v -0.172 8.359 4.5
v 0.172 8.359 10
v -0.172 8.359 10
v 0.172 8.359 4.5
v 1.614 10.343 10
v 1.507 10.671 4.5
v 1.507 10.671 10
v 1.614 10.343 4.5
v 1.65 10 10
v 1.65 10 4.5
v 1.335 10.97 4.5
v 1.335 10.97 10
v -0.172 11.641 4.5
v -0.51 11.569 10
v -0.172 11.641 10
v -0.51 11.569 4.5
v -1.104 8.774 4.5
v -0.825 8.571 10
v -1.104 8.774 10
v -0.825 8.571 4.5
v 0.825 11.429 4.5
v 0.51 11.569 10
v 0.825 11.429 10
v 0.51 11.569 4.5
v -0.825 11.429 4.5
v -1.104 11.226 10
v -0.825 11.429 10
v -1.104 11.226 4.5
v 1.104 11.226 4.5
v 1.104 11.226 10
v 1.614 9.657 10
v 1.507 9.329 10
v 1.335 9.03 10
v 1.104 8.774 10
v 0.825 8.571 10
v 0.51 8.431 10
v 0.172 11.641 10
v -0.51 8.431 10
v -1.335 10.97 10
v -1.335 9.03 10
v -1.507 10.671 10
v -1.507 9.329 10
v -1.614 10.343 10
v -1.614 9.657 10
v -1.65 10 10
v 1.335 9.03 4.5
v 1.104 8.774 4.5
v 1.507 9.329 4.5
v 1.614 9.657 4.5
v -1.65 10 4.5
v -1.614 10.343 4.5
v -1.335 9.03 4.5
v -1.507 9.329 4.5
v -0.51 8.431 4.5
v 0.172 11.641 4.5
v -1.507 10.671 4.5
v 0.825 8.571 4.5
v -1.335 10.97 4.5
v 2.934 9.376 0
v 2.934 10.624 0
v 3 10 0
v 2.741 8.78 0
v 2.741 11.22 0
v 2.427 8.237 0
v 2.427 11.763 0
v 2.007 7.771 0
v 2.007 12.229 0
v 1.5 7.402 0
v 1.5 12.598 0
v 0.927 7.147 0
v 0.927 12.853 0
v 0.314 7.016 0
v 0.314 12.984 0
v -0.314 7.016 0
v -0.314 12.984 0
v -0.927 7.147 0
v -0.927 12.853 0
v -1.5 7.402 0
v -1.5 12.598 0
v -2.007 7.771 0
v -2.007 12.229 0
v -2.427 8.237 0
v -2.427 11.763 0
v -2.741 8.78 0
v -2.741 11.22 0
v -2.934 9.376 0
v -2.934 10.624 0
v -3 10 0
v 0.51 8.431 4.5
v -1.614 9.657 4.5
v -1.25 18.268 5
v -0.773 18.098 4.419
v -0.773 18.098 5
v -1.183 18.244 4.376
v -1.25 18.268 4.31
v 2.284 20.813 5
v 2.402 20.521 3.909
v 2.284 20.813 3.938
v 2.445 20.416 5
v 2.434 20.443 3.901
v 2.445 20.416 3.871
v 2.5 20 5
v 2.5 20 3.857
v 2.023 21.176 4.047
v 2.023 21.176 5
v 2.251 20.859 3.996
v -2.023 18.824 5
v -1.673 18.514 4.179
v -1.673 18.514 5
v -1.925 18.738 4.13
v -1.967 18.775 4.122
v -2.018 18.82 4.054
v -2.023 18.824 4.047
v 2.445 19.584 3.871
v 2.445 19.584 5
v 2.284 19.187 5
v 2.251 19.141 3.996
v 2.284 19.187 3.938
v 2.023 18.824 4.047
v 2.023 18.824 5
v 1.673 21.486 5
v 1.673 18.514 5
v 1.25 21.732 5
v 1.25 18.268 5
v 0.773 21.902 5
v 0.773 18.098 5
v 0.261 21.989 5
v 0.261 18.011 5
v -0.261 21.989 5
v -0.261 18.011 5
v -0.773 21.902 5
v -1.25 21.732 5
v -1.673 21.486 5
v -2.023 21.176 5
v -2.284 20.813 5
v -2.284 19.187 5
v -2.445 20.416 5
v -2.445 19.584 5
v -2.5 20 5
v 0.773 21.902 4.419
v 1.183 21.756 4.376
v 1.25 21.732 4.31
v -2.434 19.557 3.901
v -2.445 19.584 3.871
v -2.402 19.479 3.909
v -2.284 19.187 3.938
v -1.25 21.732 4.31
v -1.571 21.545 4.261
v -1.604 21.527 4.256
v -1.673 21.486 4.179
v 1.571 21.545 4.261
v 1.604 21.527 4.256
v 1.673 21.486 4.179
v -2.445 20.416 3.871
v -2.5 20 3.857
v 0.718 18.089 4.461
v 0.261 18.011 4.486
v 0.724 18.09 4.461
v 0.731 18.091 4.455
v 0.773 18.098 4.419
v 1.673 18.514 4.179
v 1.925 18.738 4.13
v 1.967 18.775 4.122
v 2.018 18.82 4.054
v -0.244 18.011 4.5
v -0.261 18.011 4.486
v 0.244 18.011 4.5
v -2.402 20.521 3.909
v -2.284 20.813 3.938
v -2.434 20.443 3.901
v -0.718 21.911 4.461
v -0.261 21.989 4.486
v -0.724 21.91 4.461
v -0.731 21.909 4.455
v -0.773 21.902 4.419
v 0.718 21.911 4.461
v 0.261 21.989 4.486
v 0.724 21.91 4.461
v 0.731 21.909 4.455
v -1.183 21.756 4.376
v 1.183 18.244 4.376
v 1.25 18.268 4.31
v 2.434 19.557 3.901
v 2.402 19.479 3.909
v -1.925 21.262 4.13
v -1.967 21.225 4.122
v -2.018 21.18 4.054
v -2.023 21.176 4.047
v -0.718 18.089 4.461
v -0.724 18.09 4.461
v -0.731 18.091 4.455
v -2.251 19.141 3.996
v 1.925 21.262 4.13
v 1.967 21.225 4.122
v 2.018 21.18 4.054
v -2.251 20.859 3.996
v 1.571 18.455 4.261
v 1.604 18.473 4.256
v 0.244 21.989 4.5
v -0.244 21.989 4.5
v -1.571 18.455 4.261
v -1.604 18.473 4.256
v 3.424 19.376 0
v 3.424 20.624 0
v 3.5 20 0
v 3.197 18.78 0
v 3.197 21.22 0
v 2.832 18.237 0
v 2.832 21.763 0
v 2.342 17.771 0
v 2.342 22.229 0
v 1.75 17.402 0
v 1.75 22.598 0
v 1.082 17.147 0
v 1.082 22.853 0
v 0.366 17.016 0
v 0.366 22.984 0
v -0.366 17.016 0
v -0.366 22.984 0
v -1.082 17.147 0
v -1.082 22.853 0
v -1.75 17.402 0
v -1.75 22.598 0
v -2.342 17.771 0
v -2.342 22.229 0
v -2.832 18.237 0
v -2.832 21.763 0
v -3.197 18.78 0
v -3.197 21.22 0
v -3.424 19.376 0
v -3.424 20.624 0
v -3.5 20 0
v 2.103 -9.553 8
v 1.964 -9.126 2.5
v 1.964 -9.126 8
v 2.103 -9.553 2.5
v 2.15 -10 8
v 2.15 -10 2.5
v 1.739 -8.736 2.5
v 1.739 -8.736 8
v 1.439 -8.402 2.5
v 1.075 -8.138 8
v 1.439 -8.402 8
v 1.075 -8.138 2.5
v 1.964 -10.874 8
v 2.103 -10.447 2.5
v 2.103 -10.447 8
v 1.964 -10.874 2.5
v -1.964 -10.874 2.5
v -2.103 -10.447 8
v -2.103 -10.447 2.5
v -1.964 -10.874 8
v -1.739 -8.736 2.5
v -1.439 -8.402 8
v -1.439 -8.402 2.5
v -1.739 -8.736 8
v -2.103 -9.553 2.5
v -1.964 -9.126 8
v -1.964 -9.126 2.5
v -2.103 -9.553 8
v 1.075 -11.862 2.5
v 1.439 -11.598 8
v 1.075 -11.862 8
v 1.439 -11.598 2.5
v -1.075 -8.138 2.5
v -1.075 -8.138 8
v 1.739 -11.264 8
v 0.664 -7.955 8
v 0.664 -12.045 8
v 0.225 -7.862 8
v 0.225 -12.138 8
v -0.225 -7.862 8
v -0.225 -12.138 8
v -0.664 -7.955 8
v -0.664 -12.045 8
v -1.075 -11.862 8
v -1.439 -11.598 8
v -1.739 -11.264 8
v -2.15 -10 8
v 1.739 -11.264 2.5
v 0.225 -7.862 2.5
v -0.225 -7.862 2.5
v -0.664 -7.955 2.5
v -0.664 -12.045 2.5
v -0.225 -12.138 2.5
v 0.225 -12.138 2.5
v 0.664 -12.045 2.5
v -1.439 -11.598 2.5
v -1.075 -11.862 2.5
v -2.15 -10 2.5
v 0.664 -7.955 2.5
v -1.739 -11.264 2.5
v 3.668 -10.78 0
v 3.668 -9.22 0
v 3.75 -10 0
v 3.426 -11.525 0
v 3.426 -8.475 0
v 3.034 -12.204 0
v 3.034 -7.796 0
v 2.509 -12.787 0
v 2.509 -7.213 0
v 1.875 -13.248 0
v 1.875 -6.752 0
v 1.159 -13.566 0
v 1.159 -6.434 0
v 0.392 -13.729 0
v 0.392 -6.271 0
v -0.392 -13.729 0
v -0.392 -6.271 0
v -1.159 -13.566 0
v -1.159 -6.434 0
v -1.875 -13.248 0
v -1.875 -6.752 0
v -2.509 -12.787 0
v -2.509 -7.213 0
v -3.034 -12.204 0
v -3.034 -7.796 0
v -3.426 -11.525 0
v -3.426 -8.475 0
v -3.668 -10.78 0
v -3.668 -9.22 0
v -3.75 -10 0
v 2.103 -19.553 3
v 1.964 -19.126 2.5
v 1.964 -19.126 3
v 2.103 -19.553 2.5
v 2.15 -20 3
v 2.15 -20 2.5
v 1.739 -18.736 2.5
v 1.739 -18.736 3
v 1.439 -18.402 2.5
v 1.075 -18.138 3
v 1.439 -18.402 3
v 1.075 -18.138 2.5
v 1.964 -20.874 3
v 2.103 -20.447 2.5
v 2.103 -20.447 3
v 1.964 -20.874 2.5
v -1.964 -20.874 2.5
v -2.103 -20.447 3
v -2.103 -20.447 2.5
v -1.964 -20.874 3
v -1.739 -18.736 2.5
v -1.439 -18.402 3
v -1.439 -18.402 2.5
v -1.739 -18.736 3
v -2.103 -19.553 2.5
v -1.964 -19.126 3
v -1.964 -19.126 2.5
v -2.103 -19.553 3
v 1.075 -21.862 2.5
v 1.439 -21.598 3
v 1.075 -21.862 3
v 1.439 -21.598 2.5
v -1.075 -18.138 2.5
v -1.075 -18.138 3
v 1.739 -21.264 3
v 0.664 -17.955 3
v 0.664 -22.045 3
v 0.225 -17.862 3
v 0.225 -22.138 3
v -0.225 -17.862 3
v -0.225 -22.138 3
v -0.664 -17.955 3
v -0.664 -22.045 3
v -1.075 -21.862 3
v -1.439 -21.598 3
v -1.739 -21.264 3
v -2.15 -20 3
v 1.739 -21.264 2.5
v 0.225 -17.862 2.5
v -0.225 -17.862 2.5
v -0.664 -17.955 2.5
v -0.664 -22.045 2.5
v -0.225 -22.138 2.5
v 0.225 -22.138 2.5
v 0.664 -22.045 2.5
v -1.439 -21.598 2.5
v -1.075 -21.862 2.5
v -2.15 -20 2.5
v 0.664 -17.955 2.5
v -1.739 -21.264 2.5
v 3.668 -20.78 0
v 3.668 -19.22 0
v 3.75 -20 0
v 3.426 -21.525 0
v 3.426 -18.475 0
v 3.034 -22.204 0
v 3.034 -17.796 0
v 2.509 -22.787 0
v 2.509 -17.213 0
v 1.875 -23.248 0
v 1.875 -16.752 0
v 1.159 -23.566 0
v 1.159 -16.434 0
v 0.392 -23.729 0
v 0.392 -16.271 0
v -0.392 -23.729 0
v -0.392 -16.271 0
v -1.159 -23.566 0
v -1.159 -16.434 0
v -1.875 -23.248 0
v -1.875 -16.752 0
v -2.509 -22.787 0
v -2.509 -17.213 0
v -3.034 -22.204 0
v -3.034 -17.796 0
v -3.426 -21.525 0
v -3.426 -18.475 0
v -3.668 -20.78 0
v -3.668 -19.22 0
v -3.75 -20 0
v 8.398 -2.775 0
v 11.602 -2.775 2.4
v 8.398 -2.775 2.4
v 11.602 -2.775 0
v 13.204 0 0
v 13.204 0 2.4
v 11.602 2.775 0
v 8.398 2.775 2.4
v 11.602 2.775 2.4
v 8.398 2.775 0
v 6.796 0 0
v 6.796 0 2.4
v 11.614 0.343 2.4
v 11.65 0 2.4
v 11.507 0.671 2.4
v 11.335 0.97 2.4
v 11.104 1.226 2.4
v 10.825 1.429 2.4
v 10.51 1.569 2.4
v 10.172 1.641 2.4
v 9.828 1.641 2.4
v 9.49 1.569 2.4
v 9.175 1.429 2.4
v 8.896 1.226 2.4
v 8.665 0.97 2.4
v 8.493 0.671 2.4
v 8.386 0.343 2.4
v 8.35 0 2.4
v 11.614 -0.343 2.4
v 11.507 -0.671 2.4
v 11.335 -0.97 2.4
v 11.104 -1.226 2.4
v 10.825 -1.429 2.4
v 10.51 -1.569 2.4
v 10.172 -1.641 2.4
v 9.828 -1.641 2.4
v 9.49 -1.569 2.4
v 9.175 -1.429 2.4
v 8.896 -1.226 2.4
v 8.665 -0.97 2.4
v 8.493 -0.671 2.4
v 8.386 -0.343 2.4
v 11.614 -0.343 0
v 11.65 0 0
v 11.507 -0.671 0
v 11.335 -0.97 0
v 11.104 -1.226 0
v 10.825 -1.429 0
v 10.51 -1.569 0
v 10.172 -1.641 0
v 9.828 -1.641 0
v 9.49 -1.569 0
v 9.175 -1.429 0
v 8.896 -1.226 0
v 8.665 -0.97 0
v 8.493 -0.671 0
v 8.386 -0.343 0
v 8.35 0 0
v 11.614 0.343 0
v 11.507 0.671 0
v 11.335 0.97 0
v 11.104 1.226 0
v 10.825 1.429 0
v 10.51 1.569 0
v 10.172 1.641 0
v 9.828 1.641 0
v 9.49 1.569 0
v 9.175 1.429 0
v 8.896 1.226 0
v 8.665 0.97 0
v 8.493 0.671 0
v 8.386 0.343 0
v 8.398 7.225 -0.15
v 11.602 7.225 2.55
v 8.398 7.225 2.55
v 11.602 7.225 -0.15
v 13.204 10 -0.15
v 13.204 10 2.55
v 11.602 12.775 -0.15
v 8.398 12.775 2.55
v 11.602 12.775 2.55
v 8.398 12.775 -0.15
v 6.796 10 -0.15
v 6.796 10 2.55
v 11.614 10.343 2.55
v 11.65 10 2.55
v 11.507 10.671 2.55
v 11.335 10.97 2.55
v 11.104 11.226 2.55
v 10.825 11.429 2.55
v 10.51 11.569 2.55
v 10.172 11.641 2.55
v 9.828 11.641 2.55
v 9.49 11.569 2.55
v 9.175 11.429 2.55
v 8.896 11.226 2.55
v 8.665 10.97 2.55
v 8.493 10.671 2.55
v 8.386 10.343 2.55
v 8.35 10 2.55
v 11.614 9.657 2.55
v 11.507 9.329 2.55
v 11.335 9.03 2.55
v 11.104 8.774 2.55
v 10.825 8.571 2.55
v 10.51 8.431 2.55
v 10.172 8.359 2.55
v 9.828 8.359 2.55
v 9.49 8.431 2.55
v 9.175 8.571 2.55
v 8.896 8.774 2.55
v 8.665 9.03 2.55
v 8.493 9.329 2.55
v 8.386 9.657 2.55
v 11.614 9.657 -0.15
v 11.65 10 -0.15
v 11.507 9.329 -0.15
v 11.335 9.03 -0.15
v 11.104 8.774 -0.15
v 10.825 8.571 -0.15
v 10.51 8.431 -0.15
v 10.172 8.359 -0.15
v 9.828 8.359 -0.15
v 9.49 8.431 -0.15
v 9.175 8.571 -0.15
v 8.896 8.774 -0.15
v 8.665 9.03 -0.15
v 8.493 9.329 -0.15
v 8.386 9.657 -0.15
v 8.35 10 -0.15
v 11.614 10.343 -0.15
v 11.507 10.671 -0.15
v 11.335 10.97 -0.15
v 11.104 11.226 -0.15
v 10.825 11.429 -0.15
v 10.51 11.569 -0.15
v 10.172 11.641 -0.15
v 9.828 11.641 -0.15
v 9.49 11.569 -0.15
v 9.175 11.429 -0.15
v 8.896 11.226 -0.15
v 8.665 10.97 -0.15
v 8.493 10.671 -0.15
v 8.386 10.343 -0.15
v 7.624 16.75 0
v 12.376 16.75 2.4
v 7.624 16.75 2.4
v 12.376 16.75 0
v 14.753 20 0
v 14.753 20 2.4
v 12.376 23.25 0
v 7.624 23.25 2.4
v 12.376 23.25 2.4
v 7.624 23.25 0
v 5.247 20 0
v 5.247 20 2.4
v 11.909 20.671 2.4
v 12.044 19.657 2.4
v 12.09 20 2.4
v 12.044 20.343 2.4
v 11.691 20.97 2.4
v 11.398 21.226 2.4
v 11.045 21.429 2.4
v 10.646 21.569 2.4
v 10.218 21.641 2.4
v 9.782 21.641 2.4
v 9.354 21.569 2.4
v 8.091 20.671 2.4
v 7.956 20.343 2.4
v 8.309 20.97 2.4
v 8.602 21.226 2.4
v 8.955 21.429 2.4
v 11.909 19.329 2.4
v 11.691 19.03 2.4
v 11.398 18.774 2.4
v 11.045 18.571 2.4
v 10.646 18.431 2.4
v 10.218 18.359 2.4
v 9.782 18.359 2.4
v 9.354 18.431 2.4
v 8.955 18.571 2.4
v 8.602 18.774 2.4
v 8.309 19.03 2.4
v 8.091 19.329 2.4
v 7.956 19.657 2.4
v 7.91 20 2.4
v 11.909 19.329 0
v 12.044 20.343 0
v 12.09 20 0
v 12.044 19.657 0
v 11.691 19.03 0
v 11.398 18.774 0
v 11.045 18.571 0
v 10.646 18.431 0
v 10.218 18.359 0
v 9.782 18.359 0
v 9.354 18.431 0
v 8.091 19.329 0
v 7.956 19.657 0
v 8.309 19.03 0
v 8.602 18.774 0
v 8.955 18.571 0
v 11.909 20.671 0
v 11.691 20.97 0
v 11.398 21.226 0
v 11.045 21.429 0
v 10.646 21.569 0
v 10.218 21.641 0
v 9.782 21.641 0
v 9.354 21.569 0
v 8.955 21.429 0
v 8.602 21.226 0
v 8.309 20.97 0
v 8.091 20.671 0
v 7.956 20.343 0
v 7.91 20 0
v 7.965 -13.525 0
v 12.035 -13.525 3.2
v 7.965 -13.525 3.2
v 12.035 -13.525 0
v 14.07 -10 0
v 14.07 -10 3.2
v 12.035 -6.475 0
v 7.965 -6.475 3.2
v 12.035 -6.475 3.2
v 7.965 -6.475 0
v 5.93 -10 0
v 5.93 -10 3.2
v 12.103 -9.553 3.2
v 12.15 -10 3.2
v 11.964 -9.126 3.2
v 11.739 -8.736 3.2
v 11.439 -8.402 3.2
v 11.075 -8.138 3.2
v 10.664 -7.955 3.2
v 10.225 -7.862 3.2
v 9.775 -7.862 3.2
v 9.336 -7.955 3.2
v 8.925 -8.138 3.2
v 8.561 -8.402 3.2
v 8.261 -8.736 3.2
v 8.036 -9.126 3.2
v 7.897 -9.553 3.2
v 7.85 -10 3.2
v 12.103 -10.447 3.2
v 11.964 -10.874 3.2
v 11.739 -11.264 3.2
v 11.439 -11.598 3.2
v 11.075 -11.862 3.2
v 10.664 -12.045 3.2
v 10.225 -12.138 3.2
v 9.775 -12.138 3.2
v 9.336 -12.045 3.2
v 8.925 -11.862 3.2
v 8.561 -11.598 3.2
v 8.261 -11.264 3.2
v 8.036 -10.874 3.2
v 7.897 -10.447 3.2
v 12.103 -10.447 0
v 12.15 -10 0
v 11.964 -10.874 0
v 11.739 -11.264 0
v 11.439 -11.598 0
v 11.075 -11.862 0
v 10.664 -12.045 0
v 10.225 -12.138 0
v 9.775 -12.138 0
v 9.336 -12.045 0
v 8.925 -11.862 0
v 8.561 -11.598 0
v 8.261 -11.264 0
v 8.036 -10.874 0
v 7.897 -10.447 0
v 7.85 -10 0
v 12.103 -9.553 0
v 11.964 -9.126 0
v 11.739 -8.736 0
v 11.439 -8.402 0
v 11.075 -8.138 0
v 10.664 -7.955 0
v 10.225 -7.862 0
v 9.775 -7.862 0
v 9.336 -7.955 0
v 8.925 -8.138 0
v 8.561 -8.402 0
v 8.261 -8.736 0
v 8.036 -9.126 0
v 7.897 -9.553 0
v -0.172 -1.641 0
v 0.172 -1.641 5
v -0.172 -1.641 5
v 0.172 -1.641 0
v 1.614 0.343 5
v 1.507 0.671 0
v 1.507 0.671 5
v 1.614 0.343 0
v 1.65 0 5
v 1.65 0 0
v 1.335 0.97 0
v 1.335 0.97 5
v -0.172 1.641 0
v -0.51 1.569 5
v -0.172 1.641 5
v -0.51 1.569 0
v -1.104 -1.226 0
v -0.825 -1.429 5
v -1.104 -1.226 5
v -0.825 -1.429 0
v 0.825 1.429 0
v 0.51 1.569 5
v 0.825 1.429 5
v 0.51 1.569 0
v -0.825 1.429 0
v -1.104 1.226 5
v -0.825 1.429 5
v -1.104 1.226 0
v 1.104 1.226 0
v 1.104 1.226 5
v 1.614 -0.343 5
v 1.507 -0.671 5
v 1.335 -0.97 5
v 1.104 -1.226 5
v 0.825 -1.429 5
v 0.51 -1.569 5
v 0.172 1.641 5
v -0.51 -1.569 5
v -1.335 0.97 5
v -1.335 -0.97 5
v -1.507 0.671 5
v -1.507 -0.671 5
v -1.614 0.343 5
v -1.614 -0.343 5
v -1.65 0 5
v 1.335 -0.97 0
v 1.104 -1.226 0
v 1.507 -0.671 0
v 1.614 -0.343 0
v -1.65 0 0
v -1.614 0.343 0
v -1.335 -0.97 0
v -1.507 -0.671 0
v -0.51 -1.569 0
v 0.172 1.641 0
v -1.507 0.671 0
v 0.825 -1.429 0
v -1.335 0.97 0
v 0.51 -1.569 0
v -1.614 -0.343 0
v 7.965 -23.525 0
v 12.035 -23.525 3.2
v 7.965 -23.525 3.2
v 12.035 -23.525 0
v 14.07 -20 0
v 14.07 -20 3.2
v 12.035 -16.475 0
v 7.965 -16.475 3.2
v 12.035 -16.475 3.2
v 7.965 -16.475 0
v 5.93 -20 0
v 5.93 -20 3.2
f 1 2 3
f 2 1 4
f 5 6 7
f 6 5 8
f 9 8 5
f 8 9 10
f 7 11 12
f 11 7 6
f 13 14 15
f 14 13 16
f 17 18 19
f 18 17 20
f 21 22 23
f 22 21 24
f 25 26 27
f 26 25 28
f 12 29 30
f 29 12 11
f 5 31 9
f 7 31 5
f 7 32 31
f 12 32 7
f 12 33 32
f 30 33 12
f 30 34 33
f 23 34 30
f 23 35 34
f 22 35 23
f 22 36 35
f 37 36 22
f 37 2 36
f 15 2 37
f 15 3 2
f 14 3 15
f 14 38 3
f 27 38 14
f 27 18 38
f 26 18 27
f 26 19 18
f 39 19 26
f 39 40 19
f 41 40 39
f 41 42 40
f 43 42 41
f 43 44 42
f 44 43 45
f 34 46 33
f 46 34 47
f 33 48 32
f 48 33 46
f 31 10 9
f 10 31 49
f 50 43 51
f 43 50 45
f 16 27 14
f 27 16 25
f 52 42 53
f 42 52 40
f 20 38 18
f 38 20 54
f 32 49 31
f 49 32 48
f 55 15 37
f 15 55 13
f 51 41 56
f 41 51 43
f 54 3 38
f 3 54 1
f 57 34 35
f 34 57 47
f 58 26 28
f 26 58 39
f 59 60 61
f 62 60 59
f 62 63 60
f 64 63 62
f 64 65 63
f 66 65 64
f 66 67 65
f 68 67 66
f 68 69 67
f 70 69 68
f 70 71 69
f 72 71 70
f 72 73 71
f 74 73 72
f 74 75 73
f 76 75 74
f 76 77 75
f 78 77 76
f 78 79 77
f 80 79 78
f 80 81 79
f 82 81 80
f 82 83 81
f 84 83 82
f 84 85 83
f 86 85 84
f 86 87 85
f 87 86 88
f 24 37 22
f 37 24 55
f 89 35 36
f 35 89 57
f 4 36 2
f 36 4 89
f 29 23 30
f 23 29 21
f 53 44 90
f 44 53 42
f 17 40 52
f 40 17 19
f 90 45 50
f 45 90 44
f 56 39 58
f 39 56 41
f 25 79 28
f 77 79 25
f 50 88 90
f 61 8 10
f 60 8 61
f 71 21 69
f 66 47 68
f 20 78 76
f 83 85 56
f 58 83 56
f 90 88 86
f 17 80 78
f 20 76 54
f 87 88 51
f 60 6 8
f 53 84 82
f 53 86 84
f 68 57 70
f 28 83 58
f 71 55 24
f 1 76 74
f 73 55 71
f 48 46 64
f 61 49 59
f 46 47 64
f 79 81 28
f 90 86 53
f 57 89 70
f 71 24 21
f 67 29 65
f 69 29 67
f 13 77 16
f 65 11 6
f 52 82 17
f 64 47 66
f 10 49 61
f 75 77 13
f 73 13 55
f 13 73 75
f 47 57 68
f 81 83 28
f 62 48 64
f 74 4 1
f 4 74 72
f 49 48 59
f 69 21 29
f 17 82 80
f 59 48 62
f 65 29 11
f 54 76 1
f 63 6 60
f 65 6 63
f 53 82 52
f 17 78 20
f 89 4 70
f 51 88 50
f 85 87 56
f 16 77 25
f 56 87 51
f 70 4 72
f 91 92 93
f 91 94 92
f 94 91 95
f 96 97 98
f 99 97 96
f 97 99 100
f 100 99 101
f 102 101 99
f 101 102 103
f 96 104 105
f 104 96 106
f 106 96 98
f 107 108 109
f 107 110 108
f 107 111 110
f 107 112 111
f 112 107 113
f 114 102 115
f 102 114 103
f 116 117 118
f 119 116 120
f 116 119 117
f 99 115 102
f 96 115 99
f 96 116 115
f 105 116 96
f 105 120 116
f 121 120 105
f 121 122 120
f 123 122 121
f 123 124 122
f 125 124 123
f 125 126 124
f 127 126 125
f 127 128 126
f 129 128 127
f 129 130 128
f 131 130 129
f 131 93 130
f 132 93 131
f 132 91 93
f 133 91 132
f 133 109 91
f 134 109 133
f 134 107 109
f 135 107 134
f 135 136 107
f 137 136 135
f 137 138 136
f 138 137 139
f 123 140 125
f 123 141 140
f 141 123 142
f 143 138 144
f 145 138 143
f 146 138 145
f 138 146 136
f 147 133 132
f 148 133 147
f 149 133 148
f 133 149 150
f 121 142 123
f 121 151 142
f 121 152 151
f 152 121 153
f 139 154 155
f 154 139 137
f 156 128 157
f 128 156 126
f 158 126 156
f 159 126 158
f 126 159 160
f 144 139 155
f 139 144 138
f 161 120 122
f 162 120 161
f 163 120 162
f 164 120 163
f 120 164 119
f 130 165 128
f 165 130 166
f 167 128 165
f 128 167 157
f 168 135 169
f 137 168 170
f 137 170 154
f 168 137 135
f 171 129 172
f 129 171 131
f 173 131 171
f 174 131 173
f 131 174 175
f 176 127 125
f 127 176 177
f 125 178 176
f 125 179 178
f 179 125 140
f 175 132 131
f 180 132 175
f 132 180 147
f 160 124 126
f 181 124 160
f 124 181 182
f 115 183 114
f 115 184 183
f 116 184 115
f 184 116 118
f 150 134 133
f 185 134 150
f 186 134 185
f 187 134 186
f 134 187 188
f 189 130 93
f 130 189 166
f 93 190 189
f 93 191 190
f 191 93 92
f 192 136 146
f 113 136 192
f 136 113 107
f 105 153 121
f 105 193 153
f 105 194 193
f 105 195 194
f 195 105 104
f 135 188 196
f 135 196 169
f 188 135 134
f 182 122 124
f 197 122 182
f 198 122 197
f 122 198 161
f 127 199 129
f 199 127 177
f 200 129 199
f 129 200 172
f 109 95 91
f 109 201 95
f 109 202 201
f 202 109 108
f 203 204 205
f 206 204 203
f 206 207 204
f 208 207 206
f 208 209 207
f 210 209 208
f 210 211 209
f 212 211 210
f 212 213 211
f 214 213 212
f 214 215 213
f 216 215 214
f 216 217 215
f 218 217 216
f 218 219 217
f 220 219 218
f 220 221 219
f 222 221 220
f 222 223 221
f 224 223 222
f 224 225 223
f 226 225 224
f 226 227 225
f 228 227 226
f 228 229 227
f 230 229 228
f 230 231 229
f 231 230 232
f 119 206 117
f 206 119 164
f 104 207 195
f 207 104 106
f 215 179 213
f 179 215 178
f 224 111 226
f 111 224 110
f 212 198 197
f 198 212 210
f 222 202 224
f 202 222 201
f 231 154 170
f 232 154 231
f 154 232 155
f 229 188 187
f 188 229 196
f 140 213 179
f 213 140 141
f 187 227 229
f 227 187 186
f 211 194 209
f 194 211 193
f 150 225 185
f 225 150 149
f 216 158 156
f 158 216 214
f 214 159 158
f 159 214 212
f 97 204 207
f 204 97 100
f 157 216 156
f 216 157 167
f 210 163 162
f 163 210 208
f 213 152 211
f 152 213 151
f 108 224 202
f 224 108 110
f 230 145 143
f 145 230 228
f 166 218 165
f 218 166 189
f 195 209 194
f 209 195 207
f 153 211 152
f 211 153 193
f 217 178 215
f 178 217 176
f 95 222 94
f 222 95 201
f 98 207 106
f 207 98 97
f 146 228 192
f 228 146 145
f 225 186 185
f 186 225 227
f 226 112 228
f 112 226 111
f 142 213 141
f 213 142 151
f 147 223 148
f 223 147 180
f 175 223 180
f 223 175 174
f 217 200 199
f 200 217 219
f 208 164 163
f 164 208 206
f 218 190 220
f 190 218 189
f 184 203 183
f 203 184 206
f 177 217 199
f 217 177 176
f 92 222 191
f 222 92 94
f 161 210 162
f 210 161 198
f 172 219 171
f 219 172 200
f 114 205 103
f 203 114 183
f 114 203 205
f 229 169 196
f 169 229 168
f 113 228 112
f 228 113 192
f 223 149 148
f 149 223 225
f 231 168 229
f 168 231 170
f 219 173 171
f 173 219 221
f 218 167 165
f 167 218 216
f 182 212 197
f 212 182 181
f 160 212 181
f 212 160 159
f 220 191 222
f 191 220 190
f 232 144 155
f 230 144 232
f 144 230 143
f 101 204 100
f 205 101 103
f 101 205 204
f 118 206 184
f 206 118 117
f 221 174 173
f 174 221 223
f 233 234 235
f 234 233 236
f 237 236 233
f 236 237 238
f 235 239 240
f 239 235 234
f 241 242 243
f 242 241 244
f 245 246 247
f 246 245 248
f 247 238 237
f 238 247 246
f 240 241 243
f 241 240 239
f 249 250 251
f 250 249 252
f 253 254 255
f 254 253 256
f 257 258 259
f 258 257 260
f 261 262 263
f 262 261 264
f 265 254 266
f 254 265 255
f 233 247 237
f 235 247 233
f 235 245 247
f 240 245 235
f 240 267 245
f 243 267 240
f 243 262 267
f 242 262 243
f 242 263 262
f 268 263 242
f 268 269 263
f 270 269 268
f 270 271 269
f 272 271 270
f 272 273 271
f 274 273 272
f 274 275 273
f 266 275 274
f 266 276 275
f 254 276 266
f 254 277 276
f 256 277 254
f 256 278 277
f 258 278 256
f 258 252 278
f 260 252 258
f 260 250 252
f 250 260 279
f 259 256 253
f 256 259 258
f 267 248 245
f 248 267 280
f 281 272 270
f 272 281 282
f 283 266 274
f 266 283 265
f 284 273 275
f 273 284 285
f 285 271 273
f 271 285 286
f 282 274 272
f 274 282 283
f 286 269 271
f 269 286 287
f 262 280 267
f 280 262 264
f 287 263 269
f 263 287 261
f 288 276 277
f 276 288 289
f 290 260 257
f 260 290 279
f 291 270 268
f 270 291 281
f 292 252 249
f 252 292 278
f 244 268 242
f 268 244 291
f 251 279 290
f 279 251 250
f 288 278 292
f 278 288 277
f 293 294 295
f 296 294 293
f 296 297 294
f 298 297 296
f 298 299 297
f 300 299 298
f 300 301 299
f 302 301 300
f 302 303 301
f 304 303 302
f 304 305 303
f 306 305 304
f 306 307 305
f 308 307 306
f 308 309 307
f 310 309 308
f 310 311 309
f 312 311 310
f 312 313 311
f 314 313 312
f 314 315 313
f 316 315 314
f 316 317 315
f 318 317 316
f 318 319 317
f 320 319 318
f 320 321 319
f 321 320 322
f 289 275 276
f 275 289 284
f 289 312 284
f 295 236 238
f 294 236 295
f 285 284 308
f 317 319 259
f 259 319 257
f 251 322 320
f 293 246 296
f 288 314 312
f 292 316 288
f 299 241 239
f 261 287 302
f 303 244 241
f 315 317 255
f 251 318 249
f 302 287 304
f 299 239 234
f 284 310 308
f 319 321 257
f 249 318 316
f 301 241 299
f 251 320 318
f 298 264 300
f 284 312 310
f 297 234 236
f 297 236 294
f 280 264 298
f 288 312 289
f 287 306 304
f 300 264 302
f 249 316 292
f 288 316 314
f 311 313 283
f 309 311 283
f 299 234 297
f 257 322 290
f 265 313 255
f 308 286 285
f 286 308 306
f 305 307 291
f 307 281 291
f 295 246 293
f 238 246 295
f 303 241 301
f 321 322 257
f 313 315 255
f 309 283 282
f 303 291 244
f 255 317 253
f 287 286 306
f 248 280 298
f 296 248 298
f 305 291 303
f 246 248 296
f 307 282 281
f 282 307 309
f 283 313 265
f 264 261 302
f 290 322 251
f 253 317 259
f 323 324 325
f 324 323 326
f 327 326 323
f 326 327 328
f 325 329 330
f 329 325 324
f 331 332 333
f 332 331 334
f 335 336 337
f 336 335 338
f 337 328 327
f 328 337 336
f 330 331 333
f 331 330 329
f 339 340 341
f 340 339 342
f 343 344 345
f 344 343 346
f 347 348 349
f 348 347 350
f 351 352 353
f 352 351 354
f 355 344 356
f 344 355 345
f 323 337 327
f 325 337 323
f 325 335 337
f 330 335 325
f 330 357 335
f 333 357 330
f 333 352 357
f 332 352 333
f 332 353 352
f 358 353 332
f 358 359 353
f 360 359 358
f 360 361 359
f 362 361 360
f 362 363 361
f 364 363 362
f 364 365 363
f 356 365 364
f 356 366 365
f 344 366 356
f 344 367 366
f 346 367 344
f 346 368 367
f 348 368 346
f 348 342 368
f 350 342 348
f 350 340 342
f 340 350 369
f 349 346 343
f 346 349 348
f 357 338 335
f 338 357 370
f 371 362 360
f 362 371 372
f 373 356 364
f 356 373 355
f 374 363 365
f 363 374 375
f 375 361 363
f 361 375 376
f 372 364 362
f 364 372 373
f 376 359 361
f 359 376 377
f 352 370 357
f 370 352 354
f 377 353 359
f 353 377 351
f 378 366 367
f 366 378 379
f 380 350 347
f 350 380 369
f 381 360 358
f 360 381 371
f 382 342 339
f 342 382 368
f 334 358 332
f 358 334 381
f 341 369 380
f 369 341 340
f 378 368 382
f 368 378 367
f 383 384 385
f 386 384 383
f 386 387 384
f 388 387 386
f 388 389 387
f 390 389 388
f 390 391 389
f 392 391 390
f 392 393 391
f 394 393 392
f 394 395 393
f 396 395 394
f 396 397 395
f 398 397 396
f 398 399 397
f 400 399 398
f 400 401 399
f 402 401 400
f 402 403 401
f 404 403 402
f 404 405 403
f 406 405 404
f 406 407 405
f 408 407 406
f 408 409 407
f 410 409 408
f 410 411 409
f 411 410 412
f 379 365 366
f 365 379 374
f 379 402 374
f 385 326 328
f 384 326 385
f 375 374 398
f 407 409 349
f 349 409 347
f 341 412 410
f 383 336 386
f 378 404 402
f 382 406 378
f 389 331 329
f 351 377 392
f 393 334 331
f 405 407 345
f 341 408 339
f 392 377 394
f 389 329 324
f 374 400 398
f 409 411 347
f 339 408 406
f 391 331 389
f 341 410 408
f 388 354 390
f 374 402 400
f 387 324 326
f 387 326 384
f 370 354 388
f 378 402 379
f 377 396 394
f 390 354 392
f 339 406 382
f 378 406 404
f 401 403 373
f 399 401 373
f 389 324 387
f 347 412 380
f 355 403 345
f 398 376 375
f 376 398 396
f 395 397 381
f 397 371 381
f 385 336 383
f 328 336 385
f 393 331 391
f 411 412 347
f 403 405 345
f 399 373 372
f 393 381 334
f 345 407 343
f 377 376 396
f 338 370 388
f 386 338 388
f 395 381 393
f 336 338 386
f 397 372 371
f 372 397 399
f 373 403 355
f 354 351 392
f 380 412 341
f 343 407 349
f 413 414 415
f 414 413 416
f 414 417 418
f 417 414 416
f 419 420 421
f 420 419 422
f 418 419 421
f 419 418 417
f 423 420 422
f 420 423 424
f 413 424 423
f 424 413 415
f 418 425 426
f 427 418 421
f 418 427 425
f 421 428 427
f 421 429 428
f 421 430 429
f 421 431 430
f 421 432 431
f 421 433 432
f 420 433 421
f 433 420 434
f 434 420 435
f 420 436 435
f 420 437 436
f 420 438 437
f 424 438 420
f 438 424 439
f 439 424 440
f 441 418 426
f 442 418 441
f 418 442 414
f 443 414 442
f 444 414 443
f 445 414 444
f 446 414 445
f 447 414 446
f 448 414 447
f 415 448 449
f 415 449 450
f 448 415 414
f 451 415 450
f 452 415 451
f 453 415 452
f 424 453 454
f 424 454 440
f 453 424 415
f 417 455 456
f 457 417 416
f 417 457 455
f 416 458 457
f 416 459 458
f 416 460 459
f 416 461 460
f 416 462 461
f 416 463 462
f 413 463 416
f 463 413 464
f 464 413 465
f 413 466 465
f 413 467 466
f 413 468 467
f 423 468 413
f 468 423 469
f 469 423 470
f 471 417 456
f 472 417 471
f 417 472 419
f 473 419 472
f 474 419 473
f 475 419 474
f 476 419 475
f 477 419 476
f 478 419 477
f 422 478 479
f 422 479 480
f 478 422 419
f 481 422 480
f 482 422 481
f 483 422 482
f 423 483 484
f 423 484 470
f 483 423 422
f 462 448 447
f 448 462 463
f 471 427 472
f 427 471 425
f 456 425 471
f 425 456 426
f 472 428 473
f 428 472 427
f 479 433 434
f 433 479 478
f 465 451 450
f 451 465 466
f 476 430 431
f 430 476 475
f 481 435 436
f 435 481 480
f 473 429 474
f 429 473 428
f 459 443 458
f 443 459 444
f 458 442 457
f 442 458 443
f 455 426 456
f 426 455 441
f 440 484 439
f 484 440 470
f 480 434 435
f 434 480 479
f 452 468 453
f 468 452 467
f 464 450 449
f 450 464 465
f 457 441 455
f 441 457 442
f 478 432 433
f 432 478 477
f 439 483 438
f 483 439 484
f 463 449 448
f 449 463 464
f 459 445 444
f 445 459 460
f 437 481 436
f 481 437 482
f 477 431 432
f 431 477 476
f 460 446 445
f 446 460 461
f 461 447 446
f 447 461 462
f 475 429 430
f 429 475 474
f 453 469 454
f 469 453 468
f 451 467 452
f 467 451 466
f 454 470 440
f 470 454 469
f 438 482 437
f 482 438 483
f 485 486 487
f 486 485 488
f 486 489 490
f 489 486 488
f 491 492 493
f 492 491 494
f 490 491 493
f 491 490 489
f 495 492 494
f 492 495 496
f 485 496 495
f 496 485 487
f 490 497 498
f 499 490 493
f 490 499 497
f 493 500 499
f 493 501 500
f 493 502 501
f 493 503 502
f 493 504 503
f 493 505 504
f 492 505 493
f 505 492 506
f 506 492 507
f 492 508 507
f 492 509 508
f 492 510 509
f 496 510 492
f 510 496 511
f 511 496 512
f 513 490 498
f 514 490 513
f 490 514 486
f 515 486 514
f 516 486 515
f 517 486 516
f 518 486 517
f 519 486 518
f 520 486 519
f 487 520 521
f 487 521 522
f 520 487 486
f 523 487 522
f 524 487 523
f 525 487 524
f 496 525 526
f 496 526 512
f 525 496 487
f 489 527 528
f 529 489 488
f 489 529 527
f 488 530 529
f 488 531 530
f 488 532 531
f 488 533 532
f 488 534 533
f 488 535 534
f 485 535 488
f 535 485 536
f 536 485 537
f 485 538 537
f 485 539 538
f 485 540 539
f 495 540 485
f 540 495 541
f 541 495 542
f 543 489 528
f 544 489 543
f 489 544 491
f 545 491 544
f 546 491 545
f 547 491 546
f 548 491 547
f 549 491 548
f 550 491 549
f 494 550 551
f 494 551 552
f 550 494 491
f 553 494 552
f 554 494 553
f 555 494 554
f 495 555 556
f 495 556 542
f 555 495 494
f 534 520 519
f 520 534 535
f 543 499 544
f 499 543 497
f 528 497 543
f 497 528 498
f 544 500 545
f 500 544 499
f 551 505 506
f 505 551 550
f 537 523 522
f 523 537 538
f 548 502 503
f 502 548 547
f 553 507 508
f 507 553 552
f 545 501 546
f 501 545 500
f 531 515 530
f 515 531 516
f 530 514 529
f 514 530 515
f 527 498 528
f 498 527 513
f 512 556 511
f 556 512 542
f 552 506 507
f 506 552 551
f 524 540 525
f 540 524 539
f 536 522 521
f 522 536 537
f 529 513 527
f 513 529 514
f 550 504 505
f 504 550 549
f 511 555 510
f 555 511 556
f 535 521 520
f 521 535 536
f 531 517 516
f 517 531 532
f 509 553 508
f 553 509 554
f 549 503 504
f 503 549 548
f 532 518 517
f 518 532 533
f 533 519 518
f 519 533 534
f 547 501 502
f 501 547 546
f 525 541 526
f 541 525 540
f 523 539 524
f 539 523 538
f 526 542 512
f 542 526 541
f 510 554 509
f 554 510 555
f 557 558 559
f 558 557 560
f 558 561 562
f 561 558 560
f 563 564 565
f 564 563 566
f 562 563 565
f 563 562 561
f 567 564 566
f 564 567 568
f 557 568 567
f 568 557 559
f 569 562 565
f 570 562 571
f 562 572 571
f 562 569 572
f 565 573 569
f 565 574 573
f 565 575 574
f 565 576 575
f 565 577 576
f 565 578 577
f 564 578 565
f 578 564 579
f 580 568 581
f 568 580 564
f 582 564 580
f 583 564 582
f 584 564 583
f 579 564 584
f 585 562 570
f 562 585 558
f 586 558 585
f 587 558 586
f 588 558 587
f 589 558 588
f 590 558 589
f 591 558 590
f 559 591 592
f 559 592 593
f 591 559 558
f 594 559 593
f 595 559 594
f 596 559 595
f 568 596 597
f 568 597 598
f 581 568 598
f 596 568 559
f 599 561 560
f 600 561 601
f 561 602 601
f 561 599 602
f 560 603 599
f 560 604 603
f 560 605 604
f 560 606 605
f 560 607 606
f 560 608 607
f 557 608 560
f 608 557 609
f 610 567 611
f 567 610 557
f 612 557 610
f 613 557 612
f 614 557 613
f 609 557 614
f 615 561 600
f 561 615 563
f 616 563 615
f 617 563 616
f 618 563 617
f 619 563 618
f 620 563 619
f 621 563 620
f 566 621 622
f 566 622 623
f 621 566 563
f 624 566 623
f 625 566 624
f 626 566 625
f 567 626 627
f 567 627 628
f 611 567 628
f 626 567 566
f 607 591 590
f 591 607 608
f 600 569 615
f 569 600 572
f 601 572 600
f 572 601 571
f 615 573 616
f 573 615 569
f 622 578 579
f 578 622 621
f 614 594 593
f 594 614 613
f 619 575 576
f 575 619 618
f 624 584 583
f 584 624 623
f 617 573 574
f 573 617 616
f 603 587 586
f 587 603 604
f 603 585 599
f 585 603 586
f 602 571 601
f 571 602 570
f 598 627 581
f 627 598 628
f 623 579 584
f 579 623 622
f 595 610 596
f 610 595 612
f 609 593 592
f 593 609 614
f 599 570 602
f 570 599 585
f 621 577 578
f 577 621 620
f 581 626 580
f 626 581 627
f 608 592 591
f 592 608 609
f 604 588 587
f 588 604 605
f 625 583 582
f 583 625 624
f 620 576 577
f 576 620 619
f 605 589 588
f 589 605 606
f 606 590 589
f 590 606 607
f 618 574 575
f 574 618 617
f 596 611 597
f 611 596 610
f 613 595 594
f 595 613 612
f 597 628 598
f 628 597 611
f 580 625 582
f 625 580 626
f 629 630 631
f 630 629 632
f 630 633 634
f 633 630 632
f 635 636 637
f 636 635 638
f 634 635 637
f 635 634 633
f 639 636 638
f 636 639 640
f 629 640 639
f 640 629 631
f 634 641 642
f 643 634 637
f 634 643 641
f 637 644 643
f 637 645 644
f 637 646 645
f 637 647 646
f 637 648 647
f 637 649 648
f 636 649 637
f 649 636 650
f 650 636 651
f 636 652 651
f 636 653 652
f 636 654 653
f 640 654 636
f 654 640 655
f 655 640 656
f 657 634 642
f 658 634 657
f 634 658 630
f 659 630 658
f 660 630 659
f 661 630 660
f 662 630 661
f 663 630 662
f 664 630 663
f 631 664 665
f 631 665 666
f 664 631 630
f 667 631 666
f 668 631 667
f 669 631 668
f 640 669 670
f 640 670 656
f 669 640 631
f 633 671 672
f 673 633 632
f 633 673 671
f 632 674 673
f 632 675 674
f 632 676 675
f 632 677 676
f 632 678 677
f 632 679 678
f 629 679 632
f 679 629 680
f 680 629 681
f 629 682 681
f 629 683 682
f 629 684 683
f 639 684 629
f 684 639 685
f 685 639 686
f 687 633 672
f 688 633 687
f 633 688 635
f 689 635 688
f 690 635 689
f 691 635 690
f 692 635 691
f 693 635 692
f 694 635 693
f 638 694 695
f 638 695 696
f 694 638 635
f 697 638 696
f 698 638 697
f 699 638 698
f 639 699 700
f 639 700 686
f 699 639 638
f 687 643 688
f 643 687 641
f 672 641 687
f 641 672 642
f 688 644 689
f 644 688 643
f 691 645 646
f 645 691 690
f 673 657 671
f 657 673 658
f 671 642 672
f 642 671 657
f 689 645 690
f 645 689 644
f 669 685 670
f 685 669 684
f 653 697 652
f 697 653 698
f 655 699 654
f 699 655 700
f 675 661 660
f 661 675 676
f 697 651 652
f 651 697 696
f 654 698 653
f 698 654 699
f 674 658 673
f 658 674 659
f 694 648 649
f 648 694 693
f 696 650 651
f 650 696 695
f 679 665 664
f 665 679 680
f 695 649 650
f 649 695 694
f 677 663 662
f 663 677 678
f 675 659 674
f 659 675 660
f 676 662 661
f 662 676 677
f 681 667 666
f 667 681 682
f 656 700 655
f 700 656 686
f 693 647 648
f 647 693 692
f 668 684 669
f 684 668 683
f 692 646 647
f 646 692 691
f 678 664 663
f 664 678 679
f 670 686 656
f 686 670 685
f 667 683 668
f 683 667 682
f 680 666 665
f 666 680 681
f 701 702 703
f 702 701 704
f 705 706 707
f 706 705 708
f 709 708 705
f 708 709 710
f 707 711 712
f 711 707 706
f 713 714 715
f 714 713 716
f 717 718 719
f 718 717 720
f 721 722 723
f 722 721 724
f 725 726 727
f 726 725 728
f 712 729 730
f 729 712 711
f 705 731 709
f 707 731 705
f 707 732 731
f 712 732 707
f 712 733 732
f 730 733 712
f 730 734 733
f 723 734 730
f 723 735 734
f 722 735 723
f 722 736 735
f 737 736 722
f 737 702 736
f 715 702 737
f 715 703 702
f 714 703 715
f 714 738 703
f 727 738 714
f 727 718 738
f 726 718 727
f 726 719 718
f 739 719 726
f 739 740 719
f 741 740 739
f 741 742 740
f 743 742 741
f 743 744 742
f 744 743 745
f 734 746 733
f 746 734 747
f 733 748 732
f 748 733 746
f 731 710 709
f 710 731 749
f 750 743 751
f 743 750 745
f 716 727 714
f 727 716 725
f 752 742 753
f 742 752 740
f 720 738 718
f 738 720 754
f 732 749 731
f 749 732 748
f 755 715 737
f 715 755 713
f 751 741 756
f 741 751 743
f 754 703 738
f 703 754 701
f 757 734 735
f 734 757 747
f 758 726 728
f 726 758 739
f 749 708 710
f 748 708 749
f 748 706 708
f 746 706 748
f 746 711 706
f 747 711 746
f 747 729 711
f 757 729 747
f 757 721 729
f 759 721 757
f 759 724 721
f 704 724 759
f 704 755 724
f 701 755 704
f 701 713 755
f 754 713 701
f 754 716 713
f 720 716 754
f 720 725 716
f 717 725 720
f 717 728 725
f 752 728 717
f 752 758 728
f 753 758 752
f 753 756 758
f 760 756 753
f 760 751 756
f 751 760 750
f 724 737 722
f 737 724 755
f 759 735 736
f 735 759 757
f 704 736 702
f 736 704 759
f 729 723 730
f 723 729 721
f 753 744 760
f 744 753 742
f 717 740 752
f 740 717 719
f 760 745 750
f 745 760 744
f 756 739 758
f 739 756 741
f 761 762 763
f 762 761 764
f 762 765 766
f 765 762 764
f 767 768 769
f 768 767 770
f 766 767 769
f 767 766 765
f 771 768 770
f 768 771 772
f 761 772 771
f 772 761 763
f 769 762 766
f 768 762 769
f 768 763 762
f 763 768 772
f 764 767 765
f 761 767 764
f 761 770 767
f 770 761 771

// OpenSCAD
// constants
$screw_tolerance = 0.15; // default screw tolerance

// get screw
function get_screw(name) =
  // different screws
  let(screws = [
    // screw name; screw diameter; countersink parameter (head diameter, head depth)
    ["M2", 2, [0, 0]], // FIXME
    ["M2.5", 2.5, [4.6, 1.5]],
    ["4-40", 2.9, [5.3, 4.5]],
    ["M3", 3, [6, 4.5]],
    ["6-32", 3.5, [6.65, 2.11]], // NOTE: countersink dimensions not confirmed
    ["M4", 4, [7.5, 2.5]], // NOTE: counter sink dimensions not confirmed
    ["M5", 5, [10, 6.5]], // NOTE: counter sink dimensions not confirmed
    ["1/4-20", 6.35, [13.50, 4.09]], // NOTE: dimensions from mcmaster carr https://www.mcmaster.com/#92210a537/=1did9kw
    ["10-24", 4.83, [10.44, 3.23]] // NOTE: dimensions from mcmaster carr https://www.mcmaster.com/92210A244/
  ])
  screws[search([name], screws)[0]];

// make a machine screw
// @param name which screw
// @param length how long to make the hole maximally
// @param countersink whether to countersink the screw
// @param invert_countersink whether to countersink the screw at the other end
// @param tolerance what tolerance to add (in mm) to the screw radius
// @param stretch how much to stretch (in mm) the radius in the x direction (to account for collapse in vertical printing), added on top of the tolerance
// @param fn $fn parameter
module machine_screw (name, length, countersink = true, invert_countersink = false, tolerance = $screw_tolerance, stretch = 0, $fn = 30) {
  // parameters
  screw = get_screw(name);
  screw_d = screw[1]; // diameter
  screw_cs = screw[2]; // counter snk
  if (countersink && screw_cs[1] > length) {
    echo("warning - length is shorter than countersink cutout");
  }

  union() {
    resize([screw_d+2*tolerance+2*stretch, 0, 0])
      cylinder(h=length, d=screw_d+2*tolerance, center=false, $fn=$fn);
    if (countersink && invert_countersink) {
      translate([0, 0, length])
        rotate([180, 0, 0])
        resize([screw_cs[0]+2*stretch, 0, 0])
          cylinder(h=screw_cs[1], d1=screw_cs[0], d2=screw_d+2*tolerance, center=false, $fn=$fn);
    } else if (countersink) {
      resize([screw_cs[0]+2*stretch, 0, 0])
        cylinder(h=screw_cs[1], d1=screw_cs[0], d2=screw_d+2*tolerance, center=false, $fn=$fn);
    }
  }
}

// make a threaded machine screw --> uses the https://github.com/JohK/nutsnbolts library
// @param name which screw
// @param length how long to make the hole maximally
// @param countersink whether to countersink the screw
// @render_threads true/false whether to render the threads, set the global $render_threads = true; to turn on globally
module threaded_machine_screw (name, length, countersink = false, render_threads = $render_threads) {
  if (countersink) {
    echo("warning - countersink not yet implemented for threaded machine screws");
    // note: this should be possible with the dimensions from the screws library for head diameter and head height!
  }
  translate([0, 0, length])
  if (render_threads) {
    //hole_threaded(name = name, thread = "modeled", l = length);
  } else {
    //hole_threaded(name = name, thread = "no", l = length);
  }
}

// examples
color("yellow") machine_screw("M3", 5, countersink = false);
color("green") translate([0, 10, 0]) machine_screw("M3", 10);
color("purple") translate([0, 20, 0]) machine_screw("M3", 5, tolerance = 0.5, stretch = 0.5);
color("red") translate([0, -10, 0]) machine_screw("M4", 8);
color("blue") translate([0, -20, 0]) machine_screw("M4", 3, z_plus = 1);



// get hex nut
function get_hexnut(name) =
  // different nuts
  let(nuts = [
    // nut name; nut width (not the radius!); nut thickness
    ["M3", 5.5, 2.4],
    ["M4", 7, 3.2],
    ["M5", 8, 4]
  ])
  nuts[search([name], nuts)[0]];


// make a hexnut
// @param name which hexnut
// @param tolerance what tolerance to add (in mm) to the screw radius
// @param stretch how much to stretch (in mm) the radius in the x direction (to account for collapse in vertical printing), added on top of the tolerance
// @param whether to add a slot for the hexnut (provide in mm total length), default is 0 (i.e. no slot)
// @param z_plus how much thicker to make shape in z (for cutouts)
// @param align whether to align the hexnut to the "bottom" (default), "center" or "top" of the current location (not the bottom)
module hexnut (name, tolerance = 0.025, stretch = 0, slot = 0, z_plus = 0, screw_hole = true, align = "bottom") {
  nut = get_hexnut(name);
  nut_w = nut[1] + 2 * tolerance;
  nut_d = nut_w/cos(180/6); // diameter
  nut_h = nut[2]+2*z_plus; // thickness
  move_z = (align == "top") ? [0, 0, -nut[2]] : ((align == "center") ? [0, 0, -nut[2]/2] : [0, 0, 0]);
  translate([0, 0, -z_plus])
  union() {
    // whether to include a slot for the nut
    if (abs(slot) > 0) {
      translate(move_z)
      translate([-abs(slot)/2 + slot/2, -nut_w/2, 0])
      cube([abs(slot), nut_w, nut_h], center=false);
    }
    // apply stretch to whole nut shape
    resize([nut_d+2*stretch, 0, 0])
      difference() {
        translate(move_z) cylinder(h=nut_h, d=nut_d, center=false, $fn=6);
        if (screw_hole) {
          // generating screw hole with default tolerance
          translate(move_z) machine_screw(name, nut_h, z_plus = 0.1, countersink = false);
        }
      }
  }
}

// examples
color("yellow") translate([10, 0, 0]) hexnut("M3");
color("green") translate([10, 10, 0]) hexnut("M3", z_plus = 0.15);
color("purple") translate([10, 20, 0]) hexnut("M3", 5, tolerance = 0.5, stretch = 1);
color("red") translate([10, -10, 0]) hexnut("M4");
color("blue") translate([10, -20, 0]) hexnut("M4", screw_hole = false);
